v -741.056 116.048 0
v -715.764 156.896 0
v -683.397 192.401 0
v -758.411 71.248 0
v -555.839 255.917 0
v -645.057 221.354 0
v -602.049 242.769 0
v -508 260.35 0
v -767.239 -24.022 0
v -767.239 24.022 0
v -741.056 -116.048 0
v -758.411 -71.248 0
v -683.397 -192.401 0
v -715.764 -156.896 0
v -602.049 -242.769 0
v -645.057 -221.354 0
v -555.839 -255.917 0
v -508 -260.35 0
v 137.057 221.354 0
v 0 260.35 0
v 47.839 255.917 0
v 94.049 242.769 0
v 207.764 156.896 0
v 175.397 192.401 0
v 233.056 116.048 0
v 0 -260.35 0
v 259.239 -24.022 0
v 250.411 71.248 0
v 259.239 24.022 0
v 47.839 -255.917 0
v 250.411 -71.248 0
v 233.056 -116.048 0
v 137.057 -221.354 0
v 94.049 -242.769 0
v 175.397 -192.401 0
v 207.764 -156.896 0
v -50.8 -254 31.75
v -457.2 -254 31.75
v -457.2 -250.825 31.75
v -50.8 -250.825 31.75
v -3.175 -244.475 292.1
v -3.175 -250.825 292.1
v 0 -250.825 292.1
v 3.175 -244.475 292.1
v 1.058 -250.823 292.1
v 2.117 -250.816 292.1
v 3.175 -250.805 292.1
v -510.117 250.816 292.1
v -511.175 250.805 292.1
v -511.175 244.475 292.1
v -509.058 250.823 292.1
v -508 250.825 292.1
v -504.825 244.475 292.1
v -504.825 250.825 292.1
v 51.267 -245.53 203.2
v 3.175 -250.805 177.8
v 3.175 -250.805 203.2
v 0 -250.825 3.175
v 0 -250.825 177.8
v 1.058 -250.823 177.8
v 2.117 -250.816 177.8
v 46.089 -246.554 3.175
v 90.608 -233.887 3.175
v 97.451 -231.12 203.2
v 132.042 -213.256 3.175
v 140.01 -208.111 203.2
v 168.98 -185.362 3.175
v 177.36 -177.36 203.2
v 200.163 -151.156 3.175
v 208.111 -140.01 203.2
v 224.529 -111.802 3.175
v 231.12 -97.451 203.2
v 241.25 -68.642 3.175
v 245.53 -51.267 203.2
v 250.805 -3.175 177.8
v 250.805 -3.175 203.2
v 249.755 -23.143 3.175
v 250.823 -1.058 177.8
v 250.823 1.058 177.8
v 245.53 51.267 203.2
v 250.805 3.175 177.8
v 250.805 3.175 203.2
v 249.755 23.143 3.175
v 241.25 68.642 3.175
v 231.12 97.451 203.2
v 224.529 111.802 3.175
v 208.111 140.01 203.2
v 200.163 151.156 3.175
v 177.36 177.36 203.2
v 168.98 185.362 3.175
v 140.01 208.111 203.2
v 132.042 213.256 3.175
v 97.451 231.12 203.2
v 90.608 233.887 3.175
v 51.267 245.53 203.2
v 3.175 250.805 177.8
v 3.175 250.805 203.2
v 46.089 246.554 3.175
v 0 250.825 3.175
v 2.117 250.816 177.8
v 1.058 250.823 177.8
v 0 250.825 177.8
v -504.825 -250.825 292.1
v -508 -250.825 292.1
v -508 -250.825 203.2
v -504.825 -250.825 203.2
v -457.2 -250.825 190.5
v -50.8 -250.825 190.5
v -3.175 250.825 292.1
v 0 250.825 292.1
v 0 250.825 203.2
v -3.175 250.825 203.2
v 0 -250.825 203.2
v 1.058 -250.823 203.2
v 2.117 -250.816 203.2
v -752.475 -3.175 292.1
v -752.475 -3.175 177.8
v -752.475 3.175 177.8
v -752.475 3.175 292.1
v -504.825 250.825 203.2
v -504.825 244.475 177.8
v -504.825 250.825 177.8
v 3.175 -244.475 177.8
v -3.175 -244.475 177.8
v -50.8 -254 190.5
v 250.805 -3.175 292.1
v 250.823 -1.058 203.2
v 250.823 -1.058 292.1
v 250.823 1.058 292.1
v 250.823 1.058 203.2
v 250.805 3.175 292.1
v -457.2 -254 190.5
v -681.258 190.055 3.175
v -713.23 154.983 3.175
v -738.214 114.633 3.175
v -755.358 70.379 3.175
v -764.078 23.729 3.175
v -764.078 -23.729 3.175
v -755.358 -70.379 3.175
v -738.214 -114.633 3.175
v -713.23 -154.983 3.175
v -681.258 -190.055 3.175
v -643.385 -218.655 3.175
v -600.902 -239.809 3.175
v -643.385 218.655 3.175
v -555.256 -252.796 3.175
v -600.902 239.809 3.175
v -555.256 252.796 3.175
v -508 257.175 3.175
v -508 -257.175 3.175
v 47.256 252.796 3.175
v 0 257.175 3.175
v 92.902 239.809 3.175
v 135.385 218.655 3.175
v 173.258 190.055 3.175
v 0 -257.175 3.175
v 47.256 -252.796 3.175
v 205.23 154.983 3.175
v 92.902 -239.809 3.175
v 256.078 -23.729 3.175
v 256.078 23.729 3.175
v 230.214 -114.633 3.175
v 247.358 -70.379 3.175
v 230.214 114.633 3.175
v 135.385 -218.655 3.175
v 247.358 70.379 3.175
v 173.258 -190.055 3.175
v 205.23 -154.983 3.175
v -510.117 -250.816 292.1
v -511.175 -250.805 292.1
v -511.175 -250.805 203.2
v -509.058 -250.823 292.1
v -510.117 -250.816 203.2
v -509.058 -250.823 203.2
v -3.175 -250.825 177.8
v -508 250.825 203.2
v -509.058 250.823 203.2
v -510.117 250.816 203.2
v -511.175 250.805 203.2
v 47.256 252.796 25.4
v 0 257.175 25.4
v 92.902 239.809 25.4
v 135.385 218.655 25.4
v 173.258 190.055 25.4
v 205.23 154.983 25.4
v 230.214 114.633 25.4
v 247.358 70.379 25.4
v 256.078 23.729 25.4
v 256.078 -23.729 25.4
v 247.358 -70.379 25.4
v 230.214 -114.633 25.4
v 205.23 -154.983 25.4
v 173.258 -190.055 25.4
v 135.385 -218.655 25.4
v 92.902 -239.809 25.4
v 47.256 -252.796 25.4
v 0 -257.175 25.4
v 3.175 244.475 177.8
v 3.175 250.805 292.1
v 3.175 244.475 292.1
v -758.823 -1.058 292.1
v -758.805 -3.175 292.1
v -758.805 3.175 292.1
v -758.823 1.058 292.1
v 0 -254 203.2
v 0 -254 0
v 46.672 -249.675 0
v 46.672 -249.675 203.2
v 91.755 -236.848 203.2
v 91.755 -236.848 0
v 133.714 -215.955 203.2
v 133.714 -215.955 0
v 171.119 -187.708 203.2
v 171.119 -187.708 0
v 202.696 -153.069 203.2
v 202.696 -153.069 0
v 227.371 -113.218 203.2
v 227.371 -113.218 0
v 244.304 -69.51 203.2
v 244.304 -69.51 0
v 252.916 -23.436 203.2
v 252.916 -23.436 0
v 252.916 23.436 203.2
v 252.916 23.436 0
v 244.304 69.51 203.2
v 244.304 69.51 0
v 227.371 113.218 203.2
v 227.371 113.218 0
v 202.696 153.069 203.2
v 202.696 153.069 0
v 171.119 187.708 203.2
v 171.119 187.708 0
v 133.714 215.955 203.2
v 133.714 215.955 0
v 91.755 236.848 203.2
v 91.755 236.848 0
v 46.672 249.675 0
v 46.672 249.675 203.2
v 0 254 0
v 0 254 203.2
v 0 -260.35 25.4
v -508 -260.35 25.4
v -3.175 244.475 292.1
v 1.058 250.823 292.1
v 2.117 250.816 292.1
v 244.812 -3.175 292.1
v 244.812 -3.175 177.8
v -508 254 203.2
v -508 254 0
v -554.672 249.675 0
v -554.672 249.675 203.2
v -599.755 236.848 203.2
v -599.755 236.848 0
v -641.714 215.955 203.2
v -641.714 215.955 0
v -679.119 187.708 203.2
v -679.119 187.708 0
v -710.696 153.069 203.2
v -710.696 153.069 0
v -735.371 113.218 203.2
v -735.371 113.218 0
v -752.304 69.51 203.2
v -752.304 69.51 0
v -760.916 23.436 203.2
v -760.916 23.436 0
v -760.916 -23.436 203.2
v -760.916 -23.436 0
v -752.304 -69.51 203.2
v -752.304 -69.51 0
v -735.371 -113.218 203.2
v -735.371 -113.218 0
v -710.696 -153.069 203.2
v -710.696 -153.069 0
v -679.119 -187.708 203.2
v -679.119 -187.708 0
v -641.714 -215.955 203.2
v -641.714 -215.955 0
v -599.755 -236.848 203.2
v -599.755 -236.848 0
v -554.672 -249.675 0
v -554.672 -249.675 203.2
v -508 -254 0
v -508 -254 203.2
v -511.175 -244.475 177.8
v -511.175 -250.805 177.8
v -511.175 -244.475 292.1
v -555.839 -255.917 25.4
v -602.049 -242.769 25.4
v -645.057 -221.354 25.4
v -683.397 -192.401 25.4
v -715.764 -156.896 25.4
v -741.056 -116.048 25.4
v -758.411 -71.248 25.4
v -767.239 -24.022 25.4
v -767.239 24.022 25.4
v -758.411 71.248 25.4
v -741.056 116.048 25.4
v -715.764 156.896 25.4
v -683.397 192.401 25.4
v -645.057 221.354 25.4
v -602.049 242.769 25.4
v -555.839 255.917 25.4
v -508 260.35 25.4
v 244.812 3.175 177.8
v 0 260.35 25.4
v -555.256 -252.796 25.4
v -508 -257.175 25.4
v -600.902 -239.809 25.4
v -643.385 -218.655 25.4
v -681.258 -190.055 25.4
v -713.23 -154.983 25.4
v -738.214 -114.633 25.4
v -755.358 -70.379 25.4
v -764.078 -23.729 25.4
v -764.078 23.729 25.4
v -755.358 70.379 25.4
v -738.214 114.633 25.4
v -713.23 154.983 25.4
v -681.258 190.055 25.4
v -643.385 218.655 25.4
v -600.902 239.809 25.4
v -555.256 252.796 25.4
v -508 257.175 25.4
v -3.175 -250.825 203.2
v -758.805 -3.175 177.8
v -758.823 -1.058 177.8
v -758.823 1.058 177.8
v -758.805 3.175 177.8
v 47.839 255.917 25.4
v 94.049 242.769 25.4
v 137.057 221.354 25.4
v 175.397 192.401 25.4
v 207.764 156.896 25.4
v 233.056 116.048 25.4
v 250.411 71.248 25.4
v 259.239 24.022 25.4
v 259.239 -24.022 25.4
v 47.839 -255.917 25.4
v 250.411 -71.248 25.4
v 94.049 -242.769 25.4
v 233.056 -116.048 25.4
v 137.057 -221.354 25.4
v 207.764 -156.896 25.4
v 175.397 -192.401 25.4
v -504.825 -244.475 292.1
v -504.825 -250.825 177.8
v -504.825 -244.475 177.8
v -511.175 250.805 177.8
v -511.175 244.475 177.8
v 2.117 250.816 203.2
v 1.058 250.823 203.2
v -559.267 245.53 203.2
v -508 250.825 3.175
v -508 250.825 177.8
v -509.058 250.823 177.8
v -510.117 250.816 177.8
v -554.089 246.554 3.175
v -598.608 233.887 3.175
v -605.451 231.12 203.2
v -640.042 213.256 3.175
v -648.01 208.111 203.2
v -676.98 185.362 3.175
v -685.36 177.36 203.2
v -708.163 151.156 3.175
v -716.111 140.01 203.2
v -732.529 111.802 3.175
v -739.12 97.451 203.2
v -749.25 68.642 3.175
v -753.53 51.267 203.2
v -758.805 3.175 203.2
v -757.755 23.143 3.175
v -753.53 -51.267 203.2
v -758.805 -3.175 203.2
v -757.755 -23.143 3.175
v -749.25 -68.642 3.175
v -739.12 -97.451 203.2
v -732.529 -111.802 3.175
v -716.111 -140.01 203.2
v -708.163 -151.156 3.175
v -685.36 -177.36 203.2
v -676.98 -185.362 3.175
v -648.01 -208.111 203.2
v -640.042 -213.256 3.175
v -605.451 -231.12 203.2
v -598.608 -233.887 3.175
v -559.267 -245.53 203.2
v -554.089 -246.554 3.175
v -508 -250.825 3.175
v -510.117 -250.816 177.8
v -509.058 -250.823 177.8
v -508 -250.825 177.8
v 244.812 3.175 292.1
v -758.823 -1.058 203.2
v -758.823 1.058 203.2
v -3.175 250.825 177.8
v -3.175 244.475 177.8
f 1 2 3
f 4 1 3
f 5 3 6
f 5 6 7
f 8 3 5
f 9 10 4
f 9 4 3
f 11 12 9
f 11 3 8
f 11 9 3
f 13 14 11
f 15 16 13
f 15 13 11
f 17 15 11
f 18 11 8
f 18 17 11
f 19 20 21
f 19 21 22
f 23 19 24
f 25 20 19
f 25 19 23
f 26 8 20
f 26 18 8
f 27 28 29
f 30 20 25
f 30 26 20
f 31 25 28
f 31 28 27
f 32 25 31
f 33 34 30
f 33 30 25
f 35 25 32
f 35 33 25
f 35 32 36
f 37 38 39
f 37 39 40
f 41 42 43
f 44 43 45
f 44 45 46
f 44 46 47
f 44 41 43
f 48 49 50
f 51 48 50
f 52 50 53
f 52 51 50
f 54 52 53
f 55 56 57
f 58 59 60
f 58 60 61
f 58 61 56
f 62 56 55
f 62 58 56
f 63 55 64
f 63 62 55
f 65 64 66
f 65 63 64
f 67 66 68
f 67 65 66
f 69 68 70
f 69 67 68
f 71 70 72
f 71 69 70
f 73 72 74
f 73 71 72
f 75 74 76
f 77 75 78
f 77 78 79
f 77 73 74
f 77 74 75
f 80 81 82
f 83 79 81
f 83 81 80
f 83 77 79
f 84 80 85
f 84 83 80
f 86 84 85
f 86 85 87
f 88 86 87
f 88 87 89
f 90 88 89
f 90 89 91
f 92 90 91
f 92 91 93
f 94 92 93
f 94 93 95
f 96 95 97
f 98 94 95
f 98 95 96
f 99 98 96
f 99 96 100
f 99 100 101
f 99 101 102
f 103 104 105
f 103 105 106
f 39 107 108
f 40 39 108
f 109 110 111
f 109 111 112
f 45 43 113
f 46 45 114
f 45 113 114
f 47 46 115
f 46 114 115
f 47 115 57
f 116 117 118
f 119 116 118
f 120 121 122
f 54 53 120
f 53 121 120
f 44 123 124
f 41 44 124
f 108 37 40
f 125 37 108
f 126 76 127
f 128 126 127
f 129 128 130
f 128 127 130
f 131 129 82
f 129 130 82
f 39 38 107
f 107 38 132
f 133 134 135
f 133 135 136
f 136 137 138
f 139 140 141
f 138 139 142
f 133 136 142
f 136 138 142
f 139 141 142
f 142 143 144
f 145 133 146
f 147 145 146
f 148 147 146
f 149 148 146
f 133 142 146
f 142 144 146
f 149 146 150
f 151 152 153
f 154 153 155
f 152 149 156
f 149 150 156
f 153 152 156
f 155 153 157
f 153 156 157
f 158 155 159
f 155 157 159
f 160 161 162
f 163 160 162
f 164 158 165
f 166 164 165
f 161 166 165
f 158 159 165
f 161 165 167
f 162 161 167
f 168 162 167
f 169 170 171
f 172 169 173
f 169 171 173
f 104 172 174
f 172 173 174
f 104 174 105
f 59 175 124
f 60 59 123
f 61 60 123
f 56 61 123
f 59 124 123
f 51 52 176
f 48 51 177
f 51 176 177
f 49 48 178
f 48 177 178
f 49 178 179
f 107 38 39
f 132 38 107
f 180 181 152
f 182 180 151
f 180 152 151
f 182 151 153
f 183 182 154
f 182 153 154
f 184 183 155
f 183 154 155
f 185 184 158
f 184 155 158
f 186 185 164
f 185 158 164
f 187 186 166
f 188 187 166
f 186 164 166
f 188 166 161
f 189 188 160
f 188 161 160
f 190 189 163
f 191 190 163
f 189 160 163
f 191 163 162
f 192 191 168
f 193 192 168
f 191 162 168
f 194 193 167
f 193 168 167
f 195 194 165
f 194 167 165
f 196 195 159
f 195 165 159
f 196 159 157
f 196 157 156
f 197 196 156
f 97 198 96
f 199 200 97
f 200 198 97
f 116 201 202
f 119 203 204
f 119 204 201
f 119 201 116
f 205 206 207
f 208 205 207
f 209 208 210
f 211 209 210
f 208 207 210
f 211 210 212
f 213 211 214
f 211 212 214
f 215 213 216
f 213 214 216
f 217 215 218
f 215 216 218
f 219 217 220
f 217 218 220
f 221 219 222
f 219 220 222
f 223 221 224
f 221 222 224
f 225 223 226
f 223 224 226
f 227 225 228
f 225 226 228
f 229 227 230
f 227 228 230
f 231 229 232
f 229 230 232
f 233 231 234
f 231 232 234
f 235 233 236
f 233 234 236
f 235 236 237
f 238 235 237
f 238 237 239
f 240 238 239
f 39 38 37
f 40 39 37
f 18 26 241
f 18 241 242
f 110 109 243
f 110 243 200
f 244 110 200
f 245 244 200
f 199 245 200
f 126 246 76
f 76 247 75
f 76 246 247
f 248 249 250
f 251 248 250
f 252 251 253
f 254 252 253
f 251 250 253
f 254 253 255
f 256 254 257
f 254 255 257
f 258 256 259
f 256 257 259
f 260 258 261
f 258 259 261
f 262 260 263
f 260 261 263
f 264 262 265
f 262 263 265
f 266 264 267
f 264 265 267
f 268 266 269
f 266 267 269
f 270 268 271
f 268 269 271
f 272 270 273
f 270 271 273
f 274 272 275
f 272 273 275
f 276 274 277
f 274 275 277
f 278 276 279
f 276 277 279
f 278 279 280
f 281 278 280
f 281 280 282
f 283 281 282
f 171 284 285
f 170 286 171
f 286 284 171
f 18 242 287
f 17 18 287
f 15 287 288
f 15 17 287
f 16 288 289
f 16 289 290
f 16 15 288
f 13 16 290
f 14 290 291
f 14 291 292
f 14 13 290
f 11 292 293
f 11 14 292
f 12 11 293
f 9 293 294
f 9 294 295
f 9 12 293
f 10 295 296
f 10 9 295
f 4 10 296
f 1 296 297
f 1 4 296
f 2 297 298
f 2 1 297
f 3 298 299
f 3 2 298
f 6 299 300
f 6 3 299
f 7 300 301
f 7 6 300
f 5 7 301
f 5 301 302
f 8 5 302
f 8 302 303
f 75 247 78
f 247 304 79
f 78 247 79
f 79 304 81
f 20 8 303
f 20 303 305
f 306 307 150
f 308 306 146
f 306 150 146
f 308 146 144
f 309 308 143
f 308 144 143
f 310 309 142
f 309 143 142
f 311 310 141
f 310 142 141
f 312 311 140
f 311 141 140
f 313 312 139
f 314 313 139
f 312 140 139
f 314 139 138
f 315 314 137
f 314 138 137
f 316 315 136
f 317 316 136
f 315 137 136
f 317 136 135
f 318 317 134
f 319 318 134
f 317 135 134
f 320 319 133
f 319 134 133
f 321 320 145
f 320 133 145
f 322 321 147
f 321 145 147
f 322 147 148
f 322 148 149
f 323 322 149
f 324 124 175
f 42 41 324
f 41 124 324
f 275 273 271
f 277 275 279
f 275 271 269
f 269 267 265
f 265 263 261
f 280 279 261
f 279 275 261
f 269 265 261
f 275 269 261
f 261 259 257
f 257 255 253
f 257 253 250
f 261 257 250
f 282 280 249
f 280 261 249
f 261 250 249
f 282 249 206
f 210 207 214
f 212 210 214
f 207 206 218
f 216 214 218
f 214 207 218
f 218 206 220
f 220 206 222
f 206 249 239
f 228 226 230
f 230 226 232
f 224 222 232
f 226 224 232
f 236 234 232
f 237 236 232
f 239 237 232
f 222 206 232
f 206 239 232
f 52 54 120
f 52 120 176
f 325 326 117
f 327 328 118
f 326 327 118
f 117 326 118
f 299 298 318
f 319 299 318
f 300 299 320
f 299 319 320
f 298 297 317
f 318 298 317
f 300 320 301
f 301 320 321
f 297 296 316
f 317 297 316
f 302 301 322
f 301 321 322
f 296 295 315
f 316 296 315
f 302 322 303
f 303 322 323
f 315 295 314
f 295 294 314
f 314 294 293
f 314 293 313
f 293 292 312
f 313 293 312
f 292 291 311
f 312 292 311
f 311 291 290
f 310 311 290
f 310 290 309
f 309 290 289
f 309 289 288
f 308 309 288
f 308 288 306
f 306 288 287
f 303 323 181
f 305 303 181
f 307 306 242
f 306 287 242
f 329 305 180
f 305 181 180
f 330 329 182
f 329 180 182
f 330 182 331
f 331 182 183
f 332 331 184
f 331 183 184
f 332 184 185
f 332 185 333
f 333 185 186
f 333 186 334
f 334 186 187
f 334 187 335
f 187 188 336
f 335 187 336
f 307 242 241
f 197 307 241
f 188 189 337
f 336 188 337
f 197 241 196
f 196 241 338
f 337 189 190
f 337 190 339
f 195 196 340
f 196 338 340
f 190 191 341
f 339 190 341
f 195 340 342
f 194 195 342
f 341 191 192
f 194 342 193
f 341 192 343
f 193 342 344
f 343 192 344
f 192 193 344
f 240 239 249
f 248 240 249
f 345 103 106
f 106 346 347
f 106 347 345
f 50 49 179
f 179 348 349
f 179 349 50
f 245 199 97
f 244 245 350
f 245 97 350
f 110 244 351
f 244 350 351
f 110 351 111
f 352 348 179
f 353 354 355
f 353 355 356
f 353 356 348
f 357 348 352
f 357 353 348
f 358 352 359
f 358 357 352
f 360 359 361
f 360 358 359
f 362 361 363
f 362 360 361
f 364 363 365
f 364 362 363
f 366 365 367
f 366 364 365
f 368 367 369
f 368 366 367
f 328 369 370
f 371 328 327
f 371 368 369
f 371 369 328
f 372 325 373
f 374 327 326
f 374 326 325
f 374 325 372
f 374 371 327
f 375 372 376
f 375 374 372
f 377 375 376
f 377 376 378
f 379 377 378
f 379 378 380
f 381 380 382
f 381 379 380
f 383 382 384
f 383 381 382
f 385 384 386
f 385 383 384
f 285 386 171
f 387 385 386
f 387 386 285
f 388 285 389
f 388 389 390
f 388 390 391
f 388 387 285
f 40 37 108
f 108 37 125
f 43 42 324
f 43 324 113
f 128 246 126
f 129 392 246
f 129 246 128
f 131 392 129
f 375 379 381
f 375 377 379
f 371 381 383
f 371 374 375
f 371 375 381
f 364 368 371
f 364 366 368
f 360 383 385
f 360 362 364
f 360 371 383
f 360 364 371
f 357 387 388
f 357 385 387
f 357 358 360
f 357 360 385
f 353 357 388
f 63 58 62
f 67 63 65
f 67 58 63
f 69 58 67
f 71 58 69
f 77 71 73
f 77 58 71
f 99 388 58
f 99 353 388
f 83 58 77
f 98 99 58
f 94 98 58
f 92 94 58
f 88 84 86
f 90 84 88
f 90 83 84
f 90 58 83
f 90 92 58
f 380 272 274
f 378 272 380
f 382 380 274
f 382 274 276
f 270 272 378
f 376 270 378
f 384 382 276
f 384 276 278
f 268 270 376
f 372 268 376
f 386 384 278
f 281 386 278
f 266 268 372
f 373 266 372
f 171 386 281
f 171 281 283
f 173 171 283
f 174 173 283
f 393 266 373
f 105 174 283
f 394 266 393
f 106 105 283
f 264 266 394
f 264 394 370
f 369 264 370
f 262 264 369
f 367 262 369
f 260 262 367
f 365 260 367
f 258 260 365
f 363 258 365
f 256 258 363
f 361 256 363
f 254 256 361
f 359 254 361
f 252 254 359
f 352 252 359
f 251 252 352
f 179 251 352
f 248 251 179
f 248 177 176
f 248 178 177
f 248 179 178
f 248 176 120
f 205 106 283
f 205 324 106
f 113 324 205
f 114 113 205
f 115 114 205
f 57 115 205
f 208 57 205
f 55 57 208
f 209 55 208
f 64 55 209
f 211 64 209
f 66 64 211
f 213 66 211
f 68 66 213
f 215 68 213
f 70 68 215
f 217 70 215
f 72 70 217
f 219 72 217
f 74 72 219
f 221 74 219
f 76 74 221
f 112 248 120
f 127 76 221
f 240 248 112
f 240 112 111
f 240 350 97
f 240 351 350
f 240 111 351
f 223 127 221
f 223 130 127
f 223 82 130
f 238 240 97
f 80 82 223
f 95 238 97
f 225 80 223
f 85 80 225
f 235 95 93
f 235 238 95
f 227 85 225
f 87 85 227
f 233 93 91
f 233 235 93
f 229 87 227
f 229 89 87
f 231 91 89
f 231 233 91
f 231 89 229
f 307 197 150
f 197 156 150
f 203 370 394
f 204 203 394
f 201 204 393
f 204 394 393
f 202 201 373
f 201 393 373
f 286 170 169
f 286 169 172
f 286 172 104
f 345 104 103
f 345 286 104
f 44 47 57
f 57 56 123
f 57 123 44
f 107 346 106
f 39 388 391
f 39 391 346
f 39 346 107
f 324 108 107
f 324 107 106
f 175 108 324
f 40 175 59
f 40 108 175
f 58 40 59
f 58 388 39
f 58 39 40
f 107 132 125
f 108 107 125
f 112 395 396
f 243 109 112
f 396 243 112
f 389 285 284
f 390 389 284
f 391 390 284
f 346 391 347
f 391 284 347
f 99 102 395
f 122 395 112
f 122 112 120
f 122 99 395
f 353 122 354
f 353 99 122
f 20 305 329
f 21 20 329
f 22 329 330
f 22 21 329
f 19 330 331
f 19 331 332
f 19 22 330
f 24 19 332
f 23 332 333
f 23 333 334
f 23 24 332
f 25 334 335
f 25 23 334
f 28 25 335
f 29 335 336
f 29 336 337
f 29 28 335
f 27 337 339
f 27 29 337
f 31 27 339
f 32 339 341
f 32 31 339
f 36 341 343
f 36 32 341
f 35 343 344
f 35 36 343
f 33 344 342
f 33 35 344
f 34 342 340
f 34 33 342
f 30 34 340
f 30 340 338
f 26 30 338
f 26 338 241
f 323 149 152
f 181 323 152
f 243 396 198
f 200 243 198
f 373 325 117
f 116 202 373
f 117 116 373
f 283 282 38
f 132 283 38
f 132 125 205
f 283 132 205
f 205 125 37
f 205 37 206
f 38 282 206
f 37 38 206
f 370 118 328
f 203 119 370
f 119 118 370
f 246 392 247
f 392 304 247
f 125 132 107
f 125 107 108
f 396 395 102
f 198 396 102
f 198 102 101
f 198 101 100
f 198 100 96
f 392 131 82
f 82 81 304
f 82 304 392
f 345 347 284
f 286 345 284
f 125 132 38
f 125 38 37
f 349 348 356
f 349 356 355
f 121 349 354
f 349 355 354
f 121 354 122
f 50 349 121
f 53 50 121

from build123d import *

# Parameters (mm, degrees)
F1_DEPTH       = 203.2
F2_T           = -3.175
F4_W           = 406.4
F4_H           = 158.75
F5_DEPTH       = 25.4
F6_W           = 406.4
F6_H           = 158.75
F7_DEPTH       = 3.175
F10_DEPTH      = 25.4
F11_T          = -3.175
F14_DEPTH      = 25.4
F14_DEPTH_BACK = 88.9


with BuildPart() as f1:
    # F0 (on Top) → F1 (new body)
    with BuildSketch(Plane.XY):
        with BuildLine():
            Line((-508, -254), (0, -254))
            ThreePointArc((0, -254), (254, 0), (0, 254))
            Line((0, 254), (-508, 254))
            ThreePointArc((-508, 254), (-762, 0), (-508, -254))
        make_face()
    extrude(amount=F1_DEPTH)

    # F2
    f2_openings = [f1.faces().sort_by_distance(p)[0] for p in [
        (-254, 0, 203.2),
    ]]
    offset(amount=F2_T, openings=f2_openings)

    # F4 (on offset) → F5 (cut)
    with BuildSketch(Plane.XZ.offset(254)):
        with Locations((-254, 111.125)):
            Rectangle(F4_W, F4_H)
    extrude(amount=-F5_DEPTH, mode=Mode.SUBTRACT)

    # F13 (on offset) → F14 (join, two sides)
    with BuildSketch(Plane.XY.offset(203.2)) as f14_sk:
        with BuildLine():
            ThreePointArc((250.8049042583, -3.175), (250.825, 0), (250.8049042583, 3.175))
            Line((250.8049042583, 3.175), (244.8118613124, 3.175))
            Line((244.8118613124, 3.175), (244.8118613124, -3.175))
            Line((244.8118613124, -3.175), (250.8049042583, -3.175))
        make_face()
        with BuildLine():
            Line((0, 250.825), (-3.175, 250.825))
            Line((-3.175, 250.825), (-3.175, 244.4750070572))
            Line((-3.175, 244.4750070572), (0, 244.4750070572))
            Line((0, 244.4750070572), (3.175, 244.4750070572))
            Line((3.175, 244.4750070572), (3.175, 250.8049042583))
            ThreePointArc((3.175, 250.8049042583), (1.587531798, 250.8199760143), (0, 250.825))
        make_face()
        with BuildLine():
            Line((-504.825, 250.825), (-508, 250.825))
            ThreePointArc((-508, 250.825), (-509.587531798, 250.8199760143), (-511.175, 250.8049042583))
            Line((-511.175, 250.8049042583), (-511.175, 244.4750070572))
            Line((-511.175, 244.4750070572), (-508, 244.4750070572))
            Line((-508, 244.4750070572), (-504.825, 244.4750070572))
            Line((-504.825, 244.4750070572), (-504.825, 250.825))
        make_face()
        with BuildLine():
            Line((-752.475, 3.175), (-758.8049042583, 3.175))
            ThreePointArc((-758.8049042583, 3.175), (-758.825, 0), (-758.8049042583, -3.175))
            Line((-758.8049042583, -3.175), (-752.475, -3.175))
            Line((-752.475, -3.175), (-752.475, 0))
            Line((-752.475, 0), (-752.475, 3.175))
        make_face()
        with BuildLine():
            Line((-511.175, -244.4750070572), (-511.175, -250.8049042583))
            ThreePointArc((-511.175, -250.8049042583), (-509.587531798, -250.8199760143), (-508, -250.825))
            Line((-508, -250.825), (-504.825, -250.825))
            Line((-504.825, -250.825), (-504.825, -244.4750070572))
            Line((-504.825, -244.4750070572), (-508, -244.4750070572))
            Line((-508, -244.4750070572), (-511.175, -244.4750070572))
        make_face()
        with BuildLine():
            Line((-3.175, -244.4750070572), (-3.175, -250.825))
            Line((-3.175, -250.825), (0, -250.825))
            ThreePointArc((0, -250.825), (1.587531798, -250.8199760143), (3.175, -250.8049042583))
            Line((3.175, -250.8049042583), (3.175, -244.4750070572))
            Line((3.175, -244.4750070572), (0, -244.4750070572))
            Line((0, -244.4750070572), (-3.175, -244.4750070572))
        make_face()
    extrude(amount=-F14_DEPTH)
    extrude(f14_sk.sketch, amount=F14_DEPTH_BACK)


with BuildPart() as f7:
    # F6 (on offset) → F7 (new body)
    with BuildSketch(Plane.XZ.offset(254)):
        with Locations((-254, 111.125)):
            Rectangle(F6_W, F6_H)
    extrude(amount=-F7_DEPTH)


with BuildPart() as f10:
    # F9 (on offset) → F10 (new body)
    with BuildSketch(Plane(origin=(0, 0, 0), x_dir=(1, 0, 0), z_dir=(0, 0, -1))):
        with BuildLine():
            ThreePointArc((-508, 260.3500051498), (-768.3500051498, 0), (-508, -260.3500051498))
            Line((-508, -260.3500051498), (0, -260.3500051498))
            ThreePointArc((0, -260.3500051498), (260.3500051498, 0), (0, 260.3500051498))
            Line((0, 260.3500051498), (-508, 260.3500051498))
        make_face()
    extrude(amount=-F10_DEPTH)

    # F11
    f11_openings = [f10.faces().sort_by_distance(p)[0] for p in [
        (-254, 0, 25.4),
    ]]
    offset(amount=F11_T, openings=f11_openings)


solid = Compound([f1.part, f7.part, f10.part])
